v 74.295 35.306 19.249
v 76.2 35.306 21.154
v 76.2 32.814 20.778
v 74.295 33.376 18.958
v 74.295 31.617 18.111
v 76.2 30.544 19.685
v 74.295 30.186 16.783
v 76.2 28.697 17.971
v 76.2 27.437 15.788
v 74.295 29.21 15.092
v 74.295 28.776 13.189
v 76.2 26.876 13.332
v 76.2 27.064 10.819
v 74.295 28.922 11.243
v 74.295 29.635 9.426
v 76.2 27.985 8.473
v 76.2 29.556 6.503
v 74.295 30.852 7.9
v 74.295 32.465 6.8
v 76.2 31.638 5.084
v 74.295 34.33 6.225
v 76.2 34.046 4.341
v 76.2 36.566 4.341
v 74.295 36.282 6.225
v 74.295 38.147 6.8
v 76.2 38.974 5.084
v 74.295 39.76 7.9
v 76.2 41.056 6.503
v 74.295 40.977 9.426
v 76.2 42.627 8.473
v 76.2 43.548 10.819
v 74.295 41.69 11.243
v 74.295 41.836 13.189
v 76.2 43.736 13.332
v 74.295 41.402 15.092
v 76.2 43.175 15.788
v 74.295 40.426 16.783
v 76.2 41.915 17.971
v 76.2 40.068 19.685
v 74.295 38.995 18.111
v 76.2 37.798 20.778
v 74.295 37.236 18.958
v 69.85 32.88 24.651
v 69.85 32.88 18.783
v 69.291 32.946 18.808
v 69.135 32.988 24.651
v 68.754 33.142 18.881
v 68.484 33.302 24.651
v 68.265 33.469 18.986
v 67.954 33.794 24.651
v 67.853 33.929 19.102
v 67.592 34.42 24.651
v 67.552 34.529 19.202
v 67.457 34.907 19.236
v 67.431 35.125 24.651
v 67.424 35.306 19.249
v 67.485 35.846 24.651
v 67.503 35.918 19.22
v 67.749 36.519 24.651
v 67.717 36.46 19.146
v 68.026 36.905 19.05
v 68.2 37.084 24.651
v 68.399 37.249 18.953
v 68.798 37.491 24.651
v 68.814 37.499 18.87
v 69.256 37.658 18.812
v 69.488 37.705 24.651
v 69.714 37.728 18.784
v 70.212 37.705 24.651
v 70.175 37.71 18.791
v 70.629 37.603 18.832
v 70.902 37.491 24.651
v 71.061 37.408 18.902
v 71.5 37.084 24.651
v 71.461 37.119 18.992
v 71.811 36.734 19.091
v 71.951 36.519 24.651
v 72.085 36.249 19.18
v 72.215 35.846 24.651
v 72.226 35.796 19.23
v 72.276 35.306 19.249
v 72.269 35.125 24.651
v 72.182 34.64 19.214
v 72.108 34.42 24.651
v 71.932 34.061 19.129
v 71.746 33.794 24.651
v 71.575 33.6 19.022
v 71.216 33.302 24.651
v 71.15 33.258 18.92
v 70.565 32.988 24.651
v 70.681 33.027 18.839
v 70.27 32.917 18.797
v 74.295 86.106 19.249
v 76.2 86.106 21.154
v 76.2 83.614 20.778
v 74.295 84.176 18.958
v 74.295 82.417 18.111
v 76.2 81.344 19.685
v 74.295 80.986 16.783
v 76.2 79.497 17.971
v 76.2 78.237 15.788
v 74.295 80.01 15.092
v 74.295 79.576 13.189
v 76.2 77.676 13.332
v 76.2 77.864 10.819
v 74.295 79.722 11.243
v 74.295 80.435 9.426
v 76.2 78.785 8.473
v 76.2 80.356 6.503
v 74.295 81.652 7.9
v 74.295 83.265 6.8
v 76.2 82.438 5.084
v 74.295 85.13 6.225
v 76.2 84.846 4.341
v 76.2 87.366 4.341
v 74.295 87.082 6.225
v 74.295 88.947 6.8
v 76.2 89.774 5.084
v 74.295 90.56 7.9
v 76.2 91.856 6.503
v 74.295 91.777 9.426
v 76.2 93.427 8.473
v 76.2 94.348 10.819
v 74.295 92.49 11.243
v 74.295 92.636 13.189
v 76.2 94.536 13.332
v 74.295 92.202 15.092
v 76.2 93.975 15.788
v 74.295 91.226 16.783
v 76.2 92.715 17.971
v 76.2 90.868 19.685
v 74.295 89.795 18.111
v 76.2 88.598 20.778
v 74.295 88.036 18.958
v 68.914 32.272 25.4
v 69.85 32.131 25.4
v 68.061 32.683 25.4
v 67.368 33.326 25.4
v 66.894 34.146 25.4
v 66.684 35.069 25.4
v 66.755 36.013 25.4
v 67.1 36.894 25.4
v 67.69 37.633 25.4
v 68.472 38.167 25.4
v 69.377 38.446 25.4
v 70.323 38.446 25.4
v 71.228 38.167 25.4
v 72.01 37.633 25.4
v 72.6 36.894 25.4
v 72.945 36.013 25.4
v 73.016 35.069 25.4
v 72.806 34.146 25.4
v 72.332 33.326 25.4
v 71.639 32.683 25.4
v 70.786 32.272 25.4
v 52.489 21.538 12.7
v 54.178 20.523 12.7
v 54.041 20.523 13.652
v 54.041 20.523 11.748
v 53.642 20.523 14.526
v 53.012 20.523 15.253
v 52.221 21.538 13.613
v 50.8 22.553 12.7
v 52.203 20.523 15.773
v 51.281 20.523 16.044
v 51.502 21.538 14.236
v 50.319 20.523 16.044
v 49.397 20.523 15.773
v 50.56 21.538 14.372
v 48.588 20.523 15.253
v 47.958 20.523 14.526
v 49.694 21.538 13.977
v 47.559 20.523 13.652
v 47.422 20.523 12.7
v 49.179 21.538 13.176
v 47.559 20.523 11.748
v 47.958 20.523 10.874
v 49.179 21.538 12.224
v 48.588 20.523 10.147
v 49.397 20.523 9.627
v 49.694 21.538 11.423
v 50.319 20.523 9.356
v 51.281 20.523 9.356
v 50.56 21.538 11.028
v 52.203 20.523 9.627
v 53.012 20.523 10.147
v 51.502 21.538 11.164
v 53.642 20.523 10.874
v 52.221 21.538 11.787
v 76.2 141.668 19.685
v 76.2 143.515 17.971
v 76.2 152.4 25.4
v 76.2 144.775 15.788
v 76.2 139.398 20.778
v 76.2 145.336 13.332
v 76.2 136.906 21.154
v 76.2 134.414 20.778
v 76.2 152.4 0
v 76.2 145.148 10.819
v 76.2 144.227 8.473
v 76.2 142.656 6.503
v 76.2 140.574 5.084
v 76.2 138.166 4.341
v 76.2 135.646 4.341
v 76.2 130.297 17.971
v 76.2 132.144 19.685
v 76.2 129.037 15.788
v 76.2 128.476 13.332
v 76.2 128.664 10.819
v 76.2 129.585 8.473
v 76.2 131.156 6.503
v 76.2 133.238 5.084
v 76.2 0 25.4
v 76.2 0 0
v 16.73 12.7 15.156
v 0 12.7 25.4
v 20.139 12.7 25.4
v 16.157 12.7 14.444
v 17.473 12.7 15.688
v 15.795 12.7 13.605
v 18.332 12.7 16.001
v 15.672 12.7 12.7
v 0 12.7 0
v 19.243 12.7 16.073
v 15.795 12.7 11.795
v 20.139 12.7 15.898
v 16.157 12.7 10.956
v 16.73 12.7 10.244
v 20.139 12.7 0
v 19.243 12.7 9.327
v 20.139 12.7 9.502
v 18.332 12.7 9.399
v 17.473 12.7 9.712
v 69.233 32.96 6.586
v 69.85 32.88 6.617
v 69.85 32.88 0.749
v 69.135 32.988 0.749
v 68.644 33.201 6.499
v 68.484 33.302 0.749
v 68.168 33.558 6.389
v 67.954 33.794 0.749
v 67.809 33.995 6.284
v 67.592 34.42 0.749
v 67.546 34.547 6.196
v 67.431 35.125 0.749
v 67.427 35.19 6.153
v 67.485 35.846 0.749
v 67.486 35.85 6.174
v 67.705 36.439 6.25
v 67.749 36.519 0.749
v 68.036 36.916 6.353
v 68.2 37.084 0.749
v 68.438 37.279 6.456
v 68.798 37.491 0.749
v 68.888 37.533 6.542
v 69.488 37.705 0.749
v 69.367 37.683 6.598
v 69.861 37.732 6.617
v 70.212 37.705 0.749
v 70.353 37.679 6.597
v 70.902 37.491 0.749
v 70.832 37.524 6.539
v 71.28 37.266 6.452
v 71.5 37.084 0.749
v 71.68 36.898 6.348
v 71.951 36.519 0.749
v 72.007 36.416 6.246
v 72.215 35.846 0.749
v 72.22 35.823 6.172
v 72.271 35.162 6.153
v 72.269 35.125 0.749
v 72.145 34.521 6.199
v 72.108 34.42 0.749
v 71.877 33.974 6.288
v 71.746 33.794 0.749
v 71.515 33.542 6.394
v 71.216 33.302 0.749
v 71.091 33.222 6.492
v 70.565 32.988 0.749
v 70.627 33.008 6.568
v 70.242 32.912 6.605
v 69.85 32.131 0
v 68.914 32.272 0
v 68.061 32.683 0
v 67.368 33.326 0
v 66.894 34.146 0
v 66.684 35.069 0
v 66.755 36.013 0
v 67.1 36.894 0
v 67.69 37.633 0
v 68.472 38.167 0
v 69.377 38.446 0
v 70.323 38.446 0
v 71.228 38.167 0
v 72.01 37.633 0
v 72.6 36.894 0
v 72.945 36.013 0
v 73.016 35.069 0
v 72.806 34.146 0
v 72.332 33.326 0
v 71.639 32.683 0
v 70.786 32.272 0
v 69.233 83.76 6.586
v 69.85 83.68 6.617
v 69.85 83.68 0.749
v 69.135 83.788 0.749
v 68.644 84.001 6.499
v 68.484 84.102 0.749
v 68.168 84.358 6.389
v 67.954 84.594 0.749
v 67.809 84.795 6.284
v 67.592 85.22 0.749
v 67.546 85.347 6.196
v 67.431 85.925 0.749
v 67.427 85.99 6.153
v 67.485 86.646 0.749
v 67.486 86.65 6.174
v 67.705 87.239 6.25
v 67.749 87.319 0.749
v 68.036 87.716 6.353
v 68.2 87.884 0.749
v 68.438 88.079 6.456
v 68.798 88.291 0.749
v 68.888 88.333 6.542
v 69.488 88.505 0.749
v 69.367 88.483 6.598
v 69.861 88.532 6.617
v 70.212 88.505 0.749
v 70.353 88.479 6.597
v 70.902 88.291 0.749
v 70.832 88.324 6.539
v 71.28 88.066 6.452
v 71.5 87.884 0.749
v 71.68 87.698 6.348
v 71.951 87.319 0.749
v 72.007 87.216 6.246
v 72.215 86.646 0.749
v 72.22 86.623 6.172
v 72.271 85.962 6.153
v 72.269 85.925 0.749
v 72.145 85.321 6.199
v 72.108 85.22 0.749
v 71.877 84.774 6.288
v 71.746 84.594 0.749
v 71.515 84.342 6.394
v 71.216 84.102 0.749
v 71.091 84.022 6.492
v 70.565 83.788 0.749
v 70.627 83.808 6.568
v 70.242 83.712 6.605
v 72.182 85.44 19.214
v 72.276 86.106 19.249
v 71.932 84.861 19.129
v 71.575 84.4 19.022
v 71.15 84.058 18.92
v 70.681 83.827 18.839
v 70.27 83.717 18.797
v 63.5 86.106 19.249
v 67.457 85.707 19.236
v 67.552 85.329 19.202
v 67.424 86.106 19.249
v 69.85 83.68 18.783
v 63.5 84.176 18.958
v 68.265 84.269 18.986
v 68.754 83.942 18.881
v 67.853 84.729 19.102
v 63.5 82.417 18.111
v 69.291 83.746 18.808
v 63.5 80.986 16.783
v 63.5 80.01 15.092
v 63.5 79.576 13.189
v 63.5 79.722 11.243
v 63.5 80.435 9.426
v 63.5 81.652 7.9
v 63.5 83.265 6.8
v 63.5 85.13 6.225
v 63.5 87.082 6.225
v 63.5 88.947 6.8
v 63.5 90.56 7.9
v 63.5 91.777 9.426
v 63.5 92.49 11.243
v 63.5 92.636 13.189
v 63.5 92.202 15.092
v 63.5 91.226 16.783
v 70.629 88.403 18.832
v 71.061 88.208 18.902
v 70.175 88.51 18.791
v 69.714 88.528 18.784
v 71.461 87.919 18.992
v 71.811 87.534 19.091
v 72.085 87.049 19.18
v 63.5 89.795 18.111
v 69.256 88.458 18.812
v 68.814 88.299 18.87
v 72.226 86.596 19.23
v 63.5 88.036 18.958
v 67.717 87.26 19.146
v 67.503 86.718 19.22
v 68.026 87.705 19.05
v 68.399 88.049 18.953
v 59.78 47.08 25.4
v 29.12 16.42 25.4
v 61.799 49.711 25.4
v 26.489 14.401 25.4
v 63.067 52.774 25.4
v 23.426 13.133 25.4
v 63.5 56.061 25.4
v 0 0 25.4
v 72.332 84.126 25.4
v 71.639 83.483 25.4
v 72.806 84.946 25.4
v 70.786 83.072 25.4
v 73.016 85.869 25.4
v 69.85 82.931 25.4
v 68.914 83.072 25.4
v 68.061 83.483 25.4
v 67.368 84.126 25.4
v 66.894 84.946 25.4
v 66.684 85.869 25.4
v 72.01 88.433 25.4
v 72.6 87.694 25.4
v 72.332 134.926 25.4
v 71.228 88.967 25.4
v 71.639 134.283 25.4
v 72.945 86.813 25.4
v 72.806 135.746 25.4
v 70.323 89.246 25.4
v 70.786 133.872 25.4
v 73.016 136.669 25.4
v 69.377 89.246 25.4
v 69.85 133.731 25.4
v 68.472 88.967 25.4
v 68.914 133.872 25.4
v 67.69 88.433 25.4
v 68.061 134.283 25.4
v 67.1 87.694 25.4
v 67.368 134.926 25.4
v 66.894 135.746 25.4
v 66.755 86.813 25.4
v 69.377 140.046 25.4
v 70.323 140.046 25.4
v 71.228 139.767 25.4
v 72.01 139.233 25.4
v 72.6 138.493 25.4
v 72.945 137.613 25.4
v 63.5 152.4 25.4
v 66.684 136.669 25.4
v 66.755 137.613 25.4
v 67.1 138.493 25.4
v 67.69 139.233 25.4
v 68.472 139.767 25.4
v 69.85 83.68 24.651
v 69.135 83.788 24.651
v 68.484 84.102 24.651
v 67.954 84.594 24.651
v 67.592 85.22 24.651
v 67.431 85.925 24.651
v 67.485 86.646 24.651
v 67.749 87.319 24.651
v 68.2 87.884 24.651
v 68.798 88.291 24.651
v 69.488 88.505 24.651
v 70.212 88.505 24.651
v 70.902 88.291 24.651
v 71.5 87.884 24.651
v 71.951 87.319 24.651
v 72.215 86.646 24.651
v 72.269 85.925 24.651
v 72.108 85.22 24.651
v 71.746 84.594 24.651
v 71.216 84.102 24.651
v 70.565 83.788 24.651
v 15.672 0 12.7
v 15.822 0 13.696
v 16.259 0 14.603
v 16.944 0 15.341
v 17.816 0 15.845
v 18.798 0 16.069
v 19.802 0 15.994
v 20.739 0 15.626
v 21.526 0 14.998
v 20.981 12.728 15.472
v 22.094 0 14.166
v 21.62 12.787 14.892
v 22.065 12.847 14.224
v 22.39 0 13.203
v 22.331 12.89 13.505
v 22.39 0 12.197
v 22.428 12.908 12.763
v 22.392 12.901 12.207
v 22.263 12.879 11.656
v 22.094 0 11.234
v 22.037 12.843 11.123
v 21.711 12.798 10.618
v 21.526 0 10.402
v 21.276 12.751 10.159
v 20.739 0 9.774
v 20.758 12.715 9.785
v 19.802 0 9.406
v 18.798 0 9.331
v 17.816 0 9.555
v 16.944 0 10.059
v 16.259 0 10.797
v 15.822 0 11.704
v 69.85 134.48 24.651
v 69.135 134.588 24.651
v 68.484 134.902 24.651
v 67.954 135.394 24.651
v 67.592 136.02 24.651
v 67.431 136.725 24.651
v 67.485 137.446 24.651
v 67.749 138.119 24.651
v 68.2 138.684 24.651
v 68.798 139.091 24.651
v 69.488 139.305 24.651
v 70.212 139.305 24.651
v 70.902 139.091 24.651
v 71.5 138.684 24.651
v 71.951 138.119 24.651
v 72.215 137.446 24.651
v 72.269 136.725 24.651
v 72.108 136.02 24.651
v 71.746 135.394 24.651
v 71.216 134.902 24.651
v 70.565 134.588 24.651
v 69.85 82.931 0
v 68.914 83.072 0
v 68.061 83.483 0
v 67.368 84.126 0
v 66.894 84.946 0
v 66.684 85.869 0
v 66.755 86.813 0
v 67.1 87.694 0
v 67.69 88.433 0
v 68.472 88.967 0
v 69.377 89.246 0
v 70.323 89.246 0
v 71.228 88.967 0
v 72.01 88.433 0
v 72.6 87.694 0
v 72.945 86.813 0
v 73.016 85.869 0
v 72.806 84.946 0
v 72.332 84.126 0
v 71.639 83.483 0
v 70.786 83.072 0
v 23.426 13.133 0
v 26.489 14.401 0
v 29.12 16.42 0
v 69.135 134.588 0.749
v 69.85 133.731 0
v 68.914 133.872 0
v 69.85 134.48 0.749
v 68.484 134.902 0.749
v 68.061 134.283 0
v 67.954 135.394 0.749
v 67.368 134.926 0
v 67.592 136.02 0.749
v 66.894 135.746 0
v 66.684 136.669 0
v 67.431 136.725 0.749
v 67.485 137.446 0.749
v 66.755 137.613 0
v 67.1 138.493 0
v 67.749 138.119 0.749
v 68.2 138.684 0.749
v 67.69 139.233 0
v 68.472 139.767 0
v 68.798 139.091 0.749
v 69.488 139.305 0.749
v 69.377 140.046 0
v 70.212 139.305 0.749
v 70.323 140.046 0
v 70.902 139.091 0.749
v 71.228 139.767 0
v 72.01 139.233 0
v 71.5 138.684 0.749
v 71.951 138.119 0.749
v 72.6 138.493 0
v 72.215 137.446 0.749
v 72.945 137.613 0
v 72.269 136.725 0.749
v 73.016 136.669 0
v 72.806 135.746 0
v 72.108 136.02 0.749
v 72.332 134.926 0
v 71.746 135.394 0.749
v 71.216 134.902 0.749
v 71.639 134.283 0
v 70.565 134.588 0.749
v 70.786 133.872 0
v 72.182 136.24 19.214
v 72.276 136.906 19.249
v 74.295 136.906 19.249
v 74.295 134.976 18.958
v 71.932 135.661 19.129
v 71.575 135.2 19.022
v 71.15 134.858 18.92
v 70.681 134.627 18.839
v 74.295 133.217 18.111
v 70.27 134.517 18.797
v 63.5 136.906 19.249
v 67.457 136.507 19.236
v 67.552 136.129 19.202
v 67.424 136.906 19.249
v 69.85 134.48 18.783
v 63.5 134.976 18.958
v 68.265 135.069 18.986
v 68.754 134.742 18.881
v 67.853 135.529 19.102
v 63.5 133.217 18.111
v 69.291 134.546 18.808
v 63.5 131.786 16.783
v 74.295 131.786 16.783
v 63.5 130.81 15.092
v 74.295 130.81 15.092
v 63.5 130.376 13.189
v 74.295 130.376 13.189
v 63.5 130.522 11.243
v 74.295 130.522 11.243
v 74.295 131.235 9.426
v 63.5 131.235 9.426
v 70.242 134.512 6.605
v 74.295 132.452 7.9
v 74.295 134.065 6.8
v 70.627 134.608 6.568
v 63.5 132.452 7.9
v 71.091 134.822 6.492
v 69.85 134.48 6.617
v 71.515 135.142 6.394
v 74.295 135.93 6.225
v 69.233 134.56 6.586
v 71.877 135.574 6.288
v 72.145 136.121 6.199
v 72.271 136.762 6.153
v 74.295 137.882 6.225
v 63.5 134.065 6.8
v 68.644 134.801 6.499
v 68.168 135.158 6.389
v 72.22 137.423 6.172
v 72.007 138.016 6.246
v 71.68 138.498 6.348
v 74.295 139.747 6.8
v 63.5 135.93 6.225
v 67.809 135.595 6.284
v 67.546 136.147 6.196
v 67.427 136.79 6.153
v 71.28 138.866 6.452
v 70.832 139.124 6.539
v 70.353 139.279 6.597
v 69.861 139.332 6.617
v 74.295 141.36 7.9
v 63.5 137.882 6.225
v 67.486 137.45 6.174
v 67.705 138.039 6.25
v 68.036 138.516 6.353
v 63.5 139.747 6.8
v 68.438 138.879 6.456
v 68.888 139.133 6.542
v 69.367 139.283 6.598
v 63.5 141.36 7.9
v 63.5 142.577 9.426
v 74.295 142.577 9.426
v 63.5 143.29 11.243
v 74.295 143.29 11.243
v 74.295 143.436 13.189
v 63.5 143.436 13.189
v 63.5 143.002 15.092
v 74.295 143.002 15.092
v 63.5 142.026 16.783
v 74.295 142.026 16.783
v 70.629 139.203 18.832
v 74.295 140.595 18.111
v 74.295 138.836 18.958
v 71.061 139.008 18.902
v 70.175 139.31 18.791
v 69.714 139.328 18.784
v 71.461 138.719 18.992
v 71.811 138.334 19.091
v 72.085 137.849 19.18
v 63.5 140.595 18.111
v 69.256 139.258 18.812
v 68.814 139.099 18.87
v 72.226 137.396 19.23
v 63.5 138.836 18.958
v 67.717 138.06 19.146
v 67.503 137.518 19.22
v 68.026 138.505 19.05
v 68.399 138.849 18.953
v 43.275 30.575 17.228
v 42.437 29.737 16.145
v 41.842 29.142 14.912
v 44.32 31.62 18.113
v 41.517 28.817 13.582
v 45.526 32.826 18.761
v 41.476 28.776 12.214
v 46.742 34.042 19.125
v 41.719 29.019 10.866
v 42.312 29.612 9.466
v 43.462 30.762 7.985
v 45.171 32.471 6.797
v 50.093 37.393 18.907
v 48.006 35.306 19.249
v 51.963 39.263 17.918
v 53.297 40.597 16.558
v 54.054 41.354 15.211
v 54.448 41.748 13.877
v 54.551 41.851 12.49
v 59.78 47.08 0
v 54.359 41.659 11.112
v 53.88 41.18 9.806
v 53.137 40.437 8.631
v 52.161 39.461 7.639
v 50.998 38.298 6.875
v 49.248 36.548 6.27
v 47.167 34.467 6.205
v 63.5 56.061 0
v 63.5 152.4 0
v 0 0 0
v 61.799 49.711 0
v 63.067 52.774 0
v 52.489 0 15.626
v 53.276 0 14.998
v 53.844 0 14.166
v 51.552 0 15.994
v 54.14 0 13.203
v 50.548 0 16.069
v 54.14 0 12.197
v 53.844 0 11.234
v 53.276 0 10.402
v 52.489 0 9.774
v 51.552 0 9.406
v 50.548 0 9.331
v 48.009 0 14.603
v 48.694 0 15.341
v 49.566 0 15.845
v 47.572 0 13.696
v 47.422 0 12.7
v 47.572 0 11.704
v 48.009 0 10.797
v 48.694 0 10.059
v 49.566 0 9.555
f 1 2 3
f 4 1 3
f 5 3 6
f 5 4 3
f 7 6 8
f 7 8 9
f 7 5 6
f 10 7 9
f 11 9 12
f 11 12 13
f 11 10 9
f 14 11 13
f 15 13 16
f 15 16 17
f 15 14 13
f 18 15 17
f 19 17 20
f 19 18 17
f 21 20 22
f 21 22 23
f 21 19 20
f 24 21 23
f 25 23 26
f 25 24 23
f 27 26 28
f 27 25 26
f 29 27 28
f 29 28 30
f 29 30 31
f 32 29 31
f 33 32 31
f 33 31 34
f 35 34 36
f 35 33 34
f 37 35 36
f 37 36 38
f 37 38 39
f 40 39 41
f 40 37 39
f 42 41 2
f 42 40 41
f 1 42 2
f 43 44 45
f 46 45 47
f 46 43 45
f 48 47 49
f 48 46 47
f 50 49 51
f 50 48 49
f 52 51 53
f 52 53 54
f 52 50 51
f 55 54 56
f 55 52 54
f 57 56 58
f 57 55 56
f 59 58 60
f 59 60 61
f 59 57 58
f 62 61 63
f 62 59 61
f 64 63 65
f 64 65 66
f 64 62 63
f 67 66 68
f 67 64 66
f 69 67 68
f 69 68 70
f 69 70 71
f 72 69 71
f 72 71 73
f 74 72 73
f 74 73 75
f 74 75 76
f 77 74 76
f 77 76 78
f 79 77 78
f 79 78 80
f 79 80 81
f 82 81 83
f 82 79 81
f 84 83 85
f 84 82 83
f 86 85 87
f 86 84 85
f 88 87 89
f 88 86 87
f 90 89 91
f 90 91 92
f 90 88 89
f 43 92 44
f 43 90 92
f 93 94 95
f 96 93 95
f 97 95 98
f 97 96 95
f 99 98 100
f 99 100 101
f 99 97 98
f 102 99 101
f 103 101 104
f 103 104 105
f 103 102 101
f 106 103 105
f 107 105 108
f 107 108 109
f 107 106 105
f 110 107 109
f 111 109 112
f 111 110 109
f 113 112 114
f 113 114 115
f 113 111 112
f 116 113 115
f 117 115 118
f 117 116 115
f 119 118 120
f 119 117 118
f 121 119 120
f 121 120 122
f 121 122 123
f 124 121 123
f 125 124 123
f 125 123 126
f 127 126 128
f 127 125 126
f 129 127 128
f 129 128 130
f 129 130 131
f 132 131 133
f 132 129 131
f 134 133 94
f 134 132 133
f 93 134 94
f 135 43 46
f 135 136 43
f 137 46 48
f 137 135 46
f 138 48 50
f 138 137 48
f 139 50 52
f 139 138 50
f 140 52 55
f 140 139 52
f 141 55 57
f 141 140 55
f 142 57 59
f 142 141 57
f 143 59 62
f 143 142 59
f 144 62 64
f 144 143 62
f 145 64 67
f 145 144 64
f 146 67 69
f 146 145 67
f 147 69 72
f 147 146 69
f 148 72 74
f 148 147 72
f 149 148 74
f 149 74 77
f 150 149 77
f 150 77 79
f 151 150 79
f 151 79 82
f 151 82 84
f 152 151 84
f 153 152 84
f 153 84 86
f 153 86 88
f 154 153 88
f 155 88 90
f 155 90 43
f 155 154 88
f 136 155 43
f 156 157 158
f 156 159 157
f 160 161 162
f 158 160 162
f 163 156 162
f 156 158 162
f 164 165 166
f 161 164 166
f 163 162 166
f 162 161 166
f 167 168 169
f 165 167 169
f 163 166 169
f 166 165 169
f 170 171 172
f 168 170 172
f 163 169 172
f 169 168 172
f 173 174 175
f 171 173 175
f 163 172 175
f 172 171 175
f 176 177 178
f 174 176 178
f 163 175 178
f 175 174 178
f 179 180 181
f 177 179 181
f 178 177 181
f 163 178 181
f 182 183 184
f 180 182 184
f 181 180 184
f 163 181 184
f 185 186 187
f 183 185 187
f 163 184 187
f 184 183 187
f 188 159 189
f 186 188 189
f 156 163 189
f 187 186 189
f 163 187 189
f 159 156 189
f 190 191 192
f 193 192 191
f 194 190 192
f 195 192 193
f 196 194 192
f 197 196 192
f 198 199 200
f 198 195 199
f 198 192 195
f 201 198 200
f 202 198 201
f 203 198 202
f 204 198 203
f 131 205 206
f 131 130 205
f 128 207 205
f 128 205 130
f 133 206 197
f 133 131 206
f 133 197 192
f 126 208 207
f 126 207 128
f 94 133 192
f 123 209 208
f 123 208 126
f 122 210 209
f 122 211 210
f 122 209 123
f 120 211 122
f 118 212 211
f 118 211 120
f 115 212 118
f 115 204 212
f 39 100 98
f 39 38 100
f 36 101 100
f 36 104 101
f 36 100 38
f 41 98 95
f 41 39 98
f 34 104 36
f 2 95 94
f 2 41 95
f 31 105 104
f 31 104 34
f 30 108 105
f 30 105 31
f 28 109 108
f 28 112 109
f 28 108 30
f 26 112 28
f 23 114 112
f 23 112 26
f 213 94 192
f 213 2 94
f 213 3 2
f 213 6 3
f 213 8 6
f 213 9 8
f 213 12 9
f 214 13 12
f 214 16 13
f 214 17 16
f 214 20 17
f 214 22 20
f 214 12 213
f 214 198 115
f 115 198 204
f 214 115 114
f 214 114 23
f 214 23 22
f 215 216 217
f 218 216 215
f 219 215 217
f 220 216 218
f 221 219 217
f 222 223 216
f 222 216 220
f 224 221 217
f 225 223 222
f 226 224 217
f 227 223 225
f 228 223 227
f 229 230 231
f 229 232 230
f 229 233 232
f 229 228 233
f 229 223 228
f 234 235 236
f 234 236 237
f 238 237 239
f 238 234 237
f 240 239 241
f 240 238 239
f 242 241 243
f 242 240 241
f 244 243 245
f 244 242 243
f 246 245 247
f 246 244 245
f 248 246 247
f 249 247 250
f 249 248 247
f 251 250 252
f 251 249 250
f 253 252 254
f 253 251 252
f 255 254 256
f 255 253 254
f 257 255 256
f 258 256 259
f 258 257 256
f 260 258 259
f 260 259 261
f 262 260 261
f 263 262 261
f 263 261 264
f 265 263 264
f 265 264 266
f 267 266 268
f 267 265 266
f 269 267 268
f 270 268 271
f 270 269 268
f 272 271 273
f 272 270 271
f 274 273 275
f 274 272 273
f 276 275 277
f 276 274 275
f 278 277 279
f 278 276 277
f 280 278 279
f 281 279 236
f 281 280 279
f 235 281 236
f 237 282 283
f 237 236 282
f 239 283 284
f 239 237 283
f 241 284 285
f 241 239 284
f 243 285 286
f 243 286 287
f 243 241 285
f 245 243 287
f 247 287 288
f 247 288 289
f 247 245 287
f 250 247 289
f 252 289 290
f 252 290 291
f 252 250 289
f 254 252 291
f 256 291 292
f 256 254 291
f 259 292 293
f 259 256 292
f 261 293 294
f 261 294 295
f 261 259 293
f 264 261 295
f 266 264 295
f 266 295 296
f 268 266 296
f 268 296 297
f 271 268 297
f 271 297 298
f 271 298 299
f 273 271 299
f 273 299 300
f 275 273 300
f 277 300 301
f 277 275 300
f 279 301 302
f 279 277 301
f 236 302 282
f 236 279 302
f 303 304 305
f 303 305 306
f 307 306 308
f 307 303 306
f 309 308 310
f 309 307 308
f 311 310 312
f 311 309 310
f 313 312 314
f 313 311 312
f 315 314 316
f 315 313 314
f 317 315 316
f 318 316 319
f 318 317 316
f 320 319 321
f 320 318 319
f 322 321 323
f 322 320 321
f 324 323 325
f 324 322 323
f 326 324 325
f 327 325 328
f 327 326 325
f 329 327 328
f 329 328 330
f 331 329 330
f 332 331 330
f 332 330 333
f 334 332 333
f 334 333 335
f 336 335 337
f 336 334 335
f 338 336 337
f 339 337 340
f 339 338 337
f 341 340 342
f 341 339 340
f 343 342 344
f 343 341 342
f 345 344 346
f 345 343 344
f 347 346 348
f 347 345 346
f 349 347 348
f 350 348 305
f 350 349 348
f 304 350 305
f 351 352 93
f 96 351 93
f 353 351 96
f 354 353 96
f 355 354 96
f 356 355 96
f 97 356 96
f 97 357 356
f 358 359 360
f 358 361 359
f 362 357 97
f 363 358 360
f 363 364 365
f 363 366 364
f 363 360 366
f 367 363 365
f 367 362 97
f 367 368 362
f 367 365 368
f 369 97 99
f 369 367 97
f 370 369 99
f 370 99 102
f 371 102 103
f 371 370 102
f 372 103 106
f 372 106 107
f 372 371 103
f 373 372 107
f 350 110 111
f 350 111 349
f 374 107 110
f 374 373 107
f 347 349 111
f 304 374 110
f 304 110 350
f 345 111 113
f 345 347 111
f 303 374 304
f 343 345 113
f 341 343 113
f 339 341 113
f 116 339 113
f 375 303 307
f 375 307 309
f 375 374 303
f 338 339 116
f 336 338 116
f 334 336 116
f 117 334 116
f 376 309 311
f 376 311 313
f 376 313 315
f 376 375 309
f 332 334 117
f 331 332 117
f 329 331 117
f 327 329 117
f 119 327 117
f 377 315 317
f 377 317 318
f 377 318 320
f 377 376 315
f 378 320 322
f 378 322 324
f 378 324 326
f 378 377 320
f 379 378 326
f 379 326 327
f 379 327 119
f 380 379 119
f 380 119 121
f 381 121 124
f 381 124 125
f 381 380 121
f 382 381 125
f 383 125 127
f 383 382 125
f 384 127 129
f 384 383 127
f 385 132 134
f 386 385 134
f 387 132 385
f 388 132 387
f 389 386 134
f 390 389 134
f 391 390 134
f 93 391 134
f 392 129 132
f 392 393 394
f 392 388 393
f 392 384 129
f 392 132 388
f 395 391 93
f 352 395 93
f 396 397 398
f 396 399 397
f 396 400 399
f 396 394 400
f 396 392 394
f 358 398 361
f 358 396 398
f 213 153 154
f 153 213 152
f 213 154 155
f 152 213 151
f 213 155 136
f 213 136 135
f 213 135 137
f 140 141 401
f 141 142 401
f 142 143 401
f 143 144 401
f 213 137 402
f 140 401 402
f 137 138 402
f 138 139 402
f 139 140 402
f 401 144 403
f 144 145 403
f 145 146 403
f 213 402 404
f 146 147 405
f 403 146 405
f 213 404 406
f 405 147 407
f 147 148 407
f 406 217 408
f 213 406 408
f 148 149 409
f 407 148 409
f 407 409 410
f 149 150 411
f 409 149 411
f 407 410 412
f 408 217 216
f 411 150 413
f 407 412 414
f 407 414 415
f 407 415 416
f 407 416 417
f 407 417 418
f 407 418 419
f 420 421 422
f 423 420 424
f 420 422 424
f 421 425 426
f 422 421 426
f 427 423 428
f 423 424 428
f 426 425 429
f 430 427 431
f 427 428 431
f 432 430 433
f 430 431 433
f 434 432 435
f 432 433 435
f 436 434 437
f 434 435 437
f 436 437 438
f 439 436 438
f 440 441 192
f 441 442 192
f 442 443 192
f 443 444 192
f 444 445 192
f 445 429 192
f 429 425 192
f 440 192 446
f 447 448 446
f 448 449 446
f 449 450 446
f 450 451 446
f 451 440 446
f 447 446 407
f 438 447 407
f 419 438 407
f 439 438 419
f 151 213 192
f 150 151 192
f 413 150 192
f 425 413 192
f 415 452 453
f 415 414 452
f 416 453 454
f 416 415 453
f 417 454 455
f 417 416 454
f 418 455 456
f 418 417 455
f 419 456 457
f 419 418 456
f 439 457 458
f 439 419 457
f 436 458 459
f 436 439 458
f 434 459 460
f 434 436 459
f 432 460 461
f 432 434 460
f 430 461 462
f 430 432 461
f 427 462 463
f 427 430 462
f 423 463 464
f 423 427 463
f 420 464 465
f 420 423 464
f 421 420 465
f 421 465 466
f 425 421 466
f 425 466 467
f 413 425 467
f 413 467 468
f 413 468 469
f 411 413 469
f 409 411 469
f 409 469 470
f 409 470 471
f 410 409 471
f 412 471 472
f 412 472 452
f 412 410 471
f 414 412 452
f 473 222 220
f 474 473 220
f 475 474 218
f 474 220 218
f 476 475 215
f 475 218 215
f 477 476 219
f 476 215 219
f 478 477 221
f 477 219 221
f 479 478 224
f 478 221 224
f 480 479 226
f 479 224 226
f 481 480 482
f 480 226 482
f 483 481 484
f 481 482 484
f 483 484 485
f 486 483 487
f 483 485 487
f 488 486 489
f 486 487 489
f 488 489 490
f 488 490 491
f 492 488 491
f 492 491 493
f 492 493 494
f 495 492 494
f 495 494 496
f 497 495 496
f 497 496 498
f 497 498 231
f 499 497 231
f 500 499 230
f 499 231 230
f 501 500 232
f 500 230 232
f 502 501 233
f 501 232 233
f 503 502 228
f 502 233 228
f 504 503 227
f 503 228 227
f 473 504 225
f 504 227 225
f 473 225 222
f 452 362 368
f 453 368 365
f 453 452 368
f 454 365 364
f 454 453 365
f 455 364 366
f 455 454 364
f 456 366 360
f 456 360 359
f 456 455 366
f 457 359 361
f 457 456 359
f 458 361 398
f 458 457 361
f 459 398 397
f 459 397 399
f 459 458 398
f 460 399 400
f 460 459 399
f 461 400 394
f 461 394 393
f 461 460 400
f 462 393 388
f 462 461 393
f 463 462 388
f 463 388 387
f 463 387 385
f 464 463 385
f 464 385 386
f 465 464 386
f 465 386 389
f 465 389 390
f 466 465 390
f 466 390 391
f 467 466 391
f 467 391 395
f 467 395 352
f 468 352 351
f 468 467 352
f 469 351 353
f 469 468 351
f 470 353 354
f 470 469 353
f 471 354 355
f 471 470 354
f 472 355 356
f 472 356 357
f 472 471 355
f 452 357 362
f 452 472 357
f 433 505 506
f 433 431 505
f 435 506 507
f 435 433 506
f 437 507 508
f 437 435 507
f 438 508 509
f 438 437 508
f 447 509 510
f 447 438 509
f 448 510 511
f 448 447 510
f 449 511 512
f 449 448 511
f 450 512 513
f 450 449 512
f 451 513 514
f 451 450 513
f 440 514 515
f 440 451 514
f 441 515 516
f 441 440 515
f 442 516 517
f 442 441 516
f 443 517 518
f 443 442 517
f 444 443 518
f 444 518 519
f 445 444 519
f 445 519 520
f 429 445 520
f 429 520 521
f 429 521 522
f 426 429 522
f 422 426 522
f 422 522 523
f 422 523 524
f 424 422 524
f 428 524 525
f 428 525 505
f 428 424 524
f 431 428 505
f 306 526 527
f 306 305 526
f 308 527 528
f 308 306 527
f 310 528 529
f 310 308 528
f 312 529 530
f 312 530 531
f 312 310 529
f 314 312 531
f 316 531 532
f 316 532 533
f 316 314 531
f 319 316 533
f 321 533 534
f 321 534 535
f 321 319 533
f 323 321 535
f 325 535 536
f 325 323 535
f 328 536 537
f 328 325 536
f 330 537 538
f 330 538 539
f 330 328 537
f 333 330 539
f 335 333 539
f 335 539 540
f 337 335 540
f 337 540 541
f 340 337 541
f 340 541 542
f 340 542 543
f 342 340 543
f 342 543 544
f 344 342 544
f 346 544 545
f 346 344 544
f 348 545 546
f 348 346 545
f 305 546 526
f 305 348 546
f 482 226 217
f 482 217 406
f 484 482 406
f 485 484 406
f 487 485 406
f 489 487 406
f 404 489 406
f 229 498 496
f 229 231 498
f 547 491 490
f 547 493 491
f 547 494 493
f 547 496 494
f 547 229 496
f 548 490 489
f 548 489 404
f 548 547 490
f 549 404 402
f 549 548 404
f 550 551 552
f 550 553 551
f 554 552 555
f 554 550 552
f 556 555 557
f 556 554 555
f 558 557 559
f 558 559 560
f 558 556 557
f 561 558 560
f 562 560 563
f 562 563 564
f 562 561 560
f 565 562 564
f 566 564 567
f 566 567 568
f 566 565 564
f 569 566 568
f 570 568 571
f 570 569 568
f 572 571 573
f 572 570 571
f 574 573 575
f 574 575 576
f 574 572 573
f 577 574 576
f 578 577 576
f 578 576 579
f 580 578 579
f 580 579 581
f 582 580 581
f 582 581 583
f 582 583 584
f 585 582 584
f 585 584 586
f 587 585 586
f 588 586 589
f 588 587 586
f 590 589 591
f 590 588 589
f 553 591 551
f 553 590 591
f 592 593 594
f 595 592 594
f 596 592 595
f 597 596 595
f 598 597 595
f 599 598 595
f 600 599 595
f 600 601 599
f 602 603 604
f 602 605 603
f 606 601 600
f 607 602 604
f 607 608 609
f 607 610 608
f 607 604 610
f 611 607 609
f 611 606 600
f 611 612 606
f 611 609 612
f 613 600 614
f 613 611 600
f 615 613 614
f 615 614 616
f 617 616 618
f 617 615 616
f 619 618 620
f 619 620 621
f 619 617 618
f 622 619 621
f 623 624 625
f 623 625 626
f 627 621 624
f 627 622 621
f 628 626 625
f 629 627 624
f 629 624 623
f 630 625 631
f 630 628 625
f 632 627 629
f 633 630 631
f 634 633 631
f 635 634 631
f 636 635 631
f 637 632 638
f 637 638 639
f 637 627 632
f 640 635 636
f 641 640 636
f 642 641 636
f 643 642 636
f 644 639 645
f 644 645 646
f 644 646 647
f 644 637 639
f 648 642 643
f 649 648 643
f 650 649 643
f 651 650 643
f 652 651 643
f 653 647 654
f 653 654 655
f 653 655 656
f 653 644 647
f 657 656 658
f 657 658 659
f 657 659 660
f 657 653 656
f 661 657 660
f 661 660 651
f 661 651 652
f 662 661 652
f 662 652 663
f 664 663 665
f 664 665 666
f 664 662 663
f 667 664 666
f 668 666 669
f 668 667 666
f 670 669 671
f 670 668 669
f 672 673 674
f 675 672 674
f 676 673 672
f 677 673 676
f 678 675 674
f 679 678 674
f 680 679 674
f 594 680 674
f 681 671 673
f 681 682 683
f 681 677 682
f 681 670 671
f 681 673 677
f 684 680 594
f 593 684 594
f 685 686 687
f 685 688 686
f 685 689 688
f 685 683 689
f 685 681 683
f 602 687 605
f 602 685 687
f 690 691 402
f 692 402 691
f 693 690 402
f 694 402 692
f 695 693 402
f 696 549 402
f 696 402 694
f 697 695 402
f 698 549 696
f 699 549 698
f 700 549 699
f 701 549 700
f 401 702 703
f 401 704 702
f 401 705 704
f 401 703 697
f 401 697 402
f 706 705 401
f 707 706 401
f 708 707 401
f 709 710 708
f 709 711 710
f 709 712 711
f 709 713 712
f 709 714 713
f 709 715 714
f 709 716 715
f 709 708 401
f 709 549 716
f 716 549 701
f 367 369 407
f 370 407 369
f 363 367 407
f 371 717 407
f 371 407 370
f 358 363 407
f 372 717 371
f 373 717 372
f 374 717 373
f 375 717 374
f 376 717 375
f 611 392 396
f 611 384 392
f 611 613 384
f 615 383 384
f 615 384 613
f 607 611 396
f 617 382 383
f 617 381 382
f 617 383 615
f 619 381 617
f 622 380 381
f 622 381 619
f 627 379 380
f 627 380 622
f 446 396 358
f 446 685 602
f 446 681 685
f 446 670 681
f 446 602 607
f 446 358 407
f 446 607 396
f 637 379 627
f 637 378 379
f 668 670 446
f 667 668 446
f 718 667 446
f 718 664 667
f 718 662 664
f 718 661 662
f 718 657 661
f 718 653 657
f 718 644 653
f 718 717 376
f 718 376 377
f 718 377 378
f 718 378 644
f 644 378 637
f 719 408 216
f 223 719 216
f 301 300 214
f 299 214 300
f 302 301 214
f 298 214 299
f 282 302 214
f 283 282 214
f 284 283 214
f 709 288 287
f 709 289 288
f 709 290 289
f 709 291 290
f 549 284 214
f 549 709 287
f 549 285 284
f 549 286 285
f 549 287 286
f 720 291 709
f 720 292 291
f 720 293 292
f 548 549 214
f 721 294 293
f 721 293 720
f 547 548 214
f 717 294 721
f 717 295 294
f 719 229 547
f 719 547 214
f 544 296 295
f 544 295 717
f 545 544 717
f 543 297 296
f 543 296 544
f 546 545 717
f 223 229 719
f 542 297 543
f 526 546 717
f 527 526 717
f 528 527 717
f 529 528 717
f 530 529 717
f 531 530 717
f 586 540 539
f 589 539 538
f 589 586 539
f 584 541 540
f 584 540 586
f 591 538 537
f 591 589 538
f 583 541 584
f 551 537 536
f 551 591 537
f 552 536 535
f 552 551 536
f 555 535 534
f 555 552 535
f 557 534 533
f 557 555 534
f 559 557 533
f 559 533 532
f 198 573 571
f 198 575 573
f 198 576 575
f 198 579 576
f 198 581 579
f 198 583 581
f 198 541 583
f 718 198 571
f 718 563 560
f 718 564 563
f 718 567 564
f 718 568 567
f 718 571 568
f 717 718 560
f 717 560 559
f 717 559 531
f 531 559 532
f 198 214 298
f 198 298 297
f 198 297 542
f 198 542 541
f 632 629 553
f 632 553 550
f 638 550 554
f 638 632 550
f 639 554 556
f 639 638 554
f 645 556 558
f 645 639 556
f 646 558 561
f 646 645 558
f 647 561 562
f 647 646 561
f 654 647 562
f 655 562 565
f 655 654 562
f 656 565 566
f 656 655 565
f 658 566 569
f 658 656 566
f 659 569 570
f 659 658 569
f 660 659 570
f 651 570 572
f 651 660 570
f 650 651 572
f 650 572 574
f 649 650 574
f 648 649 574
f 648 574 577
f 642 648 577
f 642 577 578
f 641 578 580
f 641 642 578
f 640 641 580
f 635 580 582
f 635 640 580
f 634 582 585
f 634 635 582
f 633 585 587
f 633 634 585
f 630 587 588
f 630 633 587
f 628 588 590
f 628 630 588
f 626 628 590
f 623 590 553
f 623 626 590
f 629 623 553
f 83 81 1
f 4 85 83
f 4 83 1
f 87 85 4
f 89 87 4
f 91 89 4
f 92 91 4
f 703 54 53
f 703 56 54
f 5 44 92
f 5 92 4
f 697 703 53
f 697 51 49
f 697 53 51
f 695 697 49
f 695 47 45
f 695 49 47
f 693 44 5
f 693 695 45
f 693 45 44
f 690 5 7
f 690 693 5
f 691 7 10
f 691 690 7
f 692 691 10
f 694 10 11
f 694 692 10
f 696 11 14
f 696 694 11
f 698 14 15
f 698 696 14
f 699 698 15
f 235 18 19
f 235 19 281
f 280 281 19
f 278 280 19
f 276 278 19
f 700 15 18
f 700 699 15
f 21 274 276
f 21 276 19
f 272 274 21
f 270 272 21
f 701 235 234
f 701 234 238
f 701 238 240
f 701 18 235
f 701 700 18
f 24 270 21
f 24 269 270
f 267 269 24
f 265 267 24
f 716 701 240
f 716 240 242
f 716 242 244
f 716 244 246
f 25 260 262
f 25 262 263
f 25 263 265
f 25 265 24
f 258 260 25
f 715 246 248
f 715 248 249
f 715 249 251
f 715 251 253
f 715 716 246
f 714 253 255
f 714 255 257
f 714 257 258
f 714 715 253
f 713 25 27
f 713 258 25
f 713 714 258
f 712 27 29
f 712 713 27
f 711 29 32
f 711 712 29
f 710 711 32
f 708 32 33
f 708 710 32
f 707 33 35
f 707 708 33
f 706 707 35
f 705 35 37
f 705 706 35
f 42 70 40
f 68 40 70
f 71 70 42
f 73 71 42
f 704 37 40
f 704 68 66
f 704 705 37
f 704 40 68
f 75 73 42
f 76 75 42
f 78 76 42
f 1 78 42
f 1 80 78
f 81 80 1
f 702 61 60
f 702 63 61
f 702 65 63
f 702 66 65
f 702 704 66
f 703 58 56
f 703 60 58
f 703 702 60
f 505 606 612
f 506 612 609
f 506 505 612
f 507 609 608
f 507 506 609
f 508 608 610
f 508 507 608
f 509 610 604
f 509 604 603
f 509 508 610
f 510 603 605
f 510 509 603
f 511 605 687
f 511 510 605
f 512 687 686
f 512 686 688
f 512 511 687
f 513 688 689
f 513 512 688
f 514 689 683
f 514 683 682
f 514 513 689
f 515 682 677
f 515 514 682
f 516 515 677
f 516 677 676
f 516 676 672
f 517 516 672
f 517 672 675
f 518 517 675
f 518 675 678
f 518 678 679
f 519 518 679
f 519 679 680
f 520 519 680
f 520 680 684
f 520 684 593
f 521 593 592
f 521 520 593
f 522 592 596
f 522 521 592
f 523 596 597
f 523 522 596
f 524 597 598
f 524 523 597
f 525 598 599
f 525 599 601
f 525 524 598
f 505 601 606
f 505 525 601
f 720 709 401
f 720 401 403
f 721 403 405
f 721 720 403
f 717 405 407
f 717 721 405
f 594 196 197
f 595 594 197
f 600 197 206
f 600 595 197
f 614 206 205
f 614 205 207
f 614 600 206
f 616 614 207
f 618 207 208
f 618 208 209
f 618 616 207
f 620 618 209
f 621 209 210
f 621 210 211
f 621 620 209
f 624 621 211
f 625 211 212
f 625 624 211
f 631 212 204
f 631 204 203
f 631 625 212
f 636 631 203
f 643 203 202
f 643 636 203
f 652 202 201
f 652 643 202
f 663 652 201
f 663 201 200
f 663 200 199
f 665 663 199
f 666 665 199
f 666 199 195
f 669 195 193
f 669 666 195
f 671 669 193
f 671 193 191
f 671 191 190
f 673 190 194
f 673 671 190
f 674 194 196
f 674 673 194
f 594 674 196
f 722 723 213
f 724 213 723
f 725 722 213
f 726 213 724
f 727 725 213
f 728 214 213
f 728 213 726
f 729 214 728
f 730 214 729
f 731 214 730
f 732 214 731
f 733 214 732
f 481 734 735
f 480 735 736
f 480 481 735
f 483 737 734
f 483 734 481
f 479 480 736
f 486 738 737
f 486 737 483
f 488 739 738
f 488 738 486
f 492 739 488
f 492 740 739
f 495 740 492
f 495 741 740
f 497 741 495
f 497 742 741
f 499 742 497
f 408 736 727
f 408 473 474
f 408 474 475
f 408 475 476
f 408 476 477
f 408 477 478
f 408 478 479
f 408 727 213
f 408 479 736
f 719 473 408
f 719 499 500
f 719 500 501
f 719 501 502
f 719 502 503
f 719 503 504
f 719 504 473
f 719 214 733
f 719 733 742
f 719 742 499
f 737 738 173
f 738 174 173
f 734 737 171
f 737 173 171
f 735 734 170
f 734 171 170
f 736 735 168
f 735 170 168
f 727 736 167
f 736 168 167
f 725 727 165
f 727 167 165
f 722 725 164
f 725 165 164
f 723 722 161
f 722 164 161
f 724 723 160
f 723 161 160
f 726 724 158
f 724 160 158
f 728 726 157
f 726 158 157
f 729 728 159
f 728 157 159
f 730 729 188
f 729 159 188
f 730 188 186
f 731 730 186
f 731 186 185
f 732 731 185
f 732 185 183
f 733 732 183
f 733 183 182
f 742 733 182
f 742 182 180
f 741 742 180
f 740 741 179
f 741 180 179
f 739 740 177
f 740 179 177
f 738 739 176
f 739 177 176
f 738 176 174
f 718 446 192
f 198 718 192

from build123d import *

# Parameters (mm, degrees)
BOSS_EXTRUDE1_DEPTH                       = 25.4
TAPPED_HOLE_FOR_1_4_20_HELICOIL1_D        = 6.7564
TAPPED_HOLE_FOR_1_4_20_HELICOIL1_DEPTH    = 20.5232
TAPPED_HOLE_FOR_1_4_20_HELICOIL1_TIP      = 2.029827343
F_33_64_0_51563_DIAMETER_HOLE1_AT_2_COUNT = 2
F_33_64_0_51563_DIAMETER_HOLE1_AT_2_PITCH = 50.8
F_33_64_0_51563_DIAMETER_HOLE1_AT_3_COUNT = 2
F_33_64_0_51563_DIAMETER_HOLE1_AT_3_PITCH = 50.8
F_11_0_191_DIAMETER_HOLE1_AT_2_COUNT      = 2
F_11_0_191_DIAMETER_HOLE1_AT_2_PITCH      = 50.8
F_11_0_191_DIAMETER_HOLE1_AT_3_COUNT      = 2
F_11_0_191_DIAMETER_HOLE1_AT_3_PITCH      = 50.8


with BuildPart() as part:
    # Sketch1 → Boss-Extrude1 (new body)
    with BuildSketch(Plane.XY):
        with BuildLine():
            Line((0, 0), (0, 12.7))
            Line((0, 12.7), (20.139487758, 12.7))
            ThreePointArc((20.139487758, 12.7), (24.999567349, 13.666729937), (29.119743879, 16.419743879))
            Line((29.119743879, 16.419743879), (59.780256121, 47.080256121))
            ThreePointArc((59.780256121, 47.080256121), (62.533270063, 51.200432651), (63.5, 56.060512242))
            Line((63.5, 56.060512242), (63.5, 152.4))
            Line((63.5, 152.4), (76.2, 152.4))
            Line((76.2, 152.4), (76.2, 0))
            Line((76.2, 0), (0, 0))
        make_face()
    extrude(amount=BOSS_EXTRUDE1_DEPTH)

    # Tapped Hole for 1/4-20 Helicoil1
    with Locations(Plane.XZ):
        with Locations((19.05, 12.7), (50.8, 12.7)):
            Hole(TAPPED_HOLE_FOR_1_4_20_HELICOIL1_D / 2, depth=TAPPED_HOLE_FOR_1_4_20_HELICOIL1_DEPTH)
            with Locations((0, 0, -(TAPPED_HOLE_FOR_1_4_20_HELICOIL1_DEPTH + TAPPED_HOLE_FOR_1_4_20_HELICOIL1_TIP / 2))):  # 118° drill point
                Cone(0, TAPPED_HOLE_FOR_1_4_20_HELICOIL1_D / 2, TAPPED_HOLE_FOR_1_4_20_HELICOIL1_TIP, mode=Mode.SUBTRACT)

    # Sketch5 → 33/64 (0.51563) Diameter Hole1 (revolve, cut)
    with BuildSketch(Plane(origin=(0, 86.106, 12.7), x_dir=(0, 0, 1), z_dir=(0, 1, 0))):
        Polygon((0, 0), (0, 76.2), (8.453501, 76.2), (6.548501, 74.295), (6.548501, 0), align=None)
    f_33_64_0_51563_diameter_hole1 = revolve(axis=Axis((-6.35, 86.106, 12.7), (1, 0, 0)), mode=Mode.SUBTRACT)

    # 33/64 (0.51563) Diameter Hole1 at 2: 33/64 (0.51563) Diameter Hole1 ×2
    with Locations(*[(0, i * F_33_64_0_51563_DIAMETER_HOLE1_AT_2_PITCH, 0) for i in range(1, F_33_64_0_51563_DIAMETER_HOLE1_AT_2_COUNT)]):
        add(f_33_64_0_51563_diameter_hole1, mode=Mode.SUBTRACT)

    # 33/64 (0.51563) Diameter Hole1 at 3: 33/64 (0.51563) Diameter Hole1 ×2
    with Locations(*[(0, -i * F_33_64_0_51563_DIAMETER_HOLE1_AT_3_PITCH, 0) for i in range(1, F_33_64_0_51563_DIAMETER_HOLE1_AT_3_COUNT)]):
        add(f_33_64_0_51563_diameter_hole1, mode=Mode.SUBTRACT)

    # Sketch7 → #11 (0.191) Diameter Hole1 (revolve, cut)
    with BuildSketch(Plane(origin=(69.85, 86.106, 25.4), x_dir=(0, -1, 0), z_dir=(1, 0, 0))):
        Polygon((0, 0), (0, 25.4), (3.175, 25.4), (2.4257, 24.6507), (2.4257, 0.7493), (3.175, 0), align=None)
    f_11_0_191_diameter_hole1 = revolve(axis=Axis((69.85, 86.106, 31.75), (0, 0, -1)), mode=Mode.SUBTRACT)

    # #11 (0.191) Diameter Hole1 at 2: #11 (0.191) Diameter Hole1 ×2
    with Locations(*[(0, i * F_11_0_191_DIAMETER_HOLE1_AT_2_PITCH, 0) for i in range(1, F_11_0_191_DIAMETER_HOLE1_AT_2_COUNT)]):
        add(f_11_0_191_diameter_hole1, mode=Mode.SUBTRACT)

    # #11 (0.191) Diameter Hole1 at 3: #11 (0.191) Diameter Hole1 ×2
    with Locations(*[(0, -i * F_11_0_191_DIAMETER_HOLE1_AT_3_PITCH, 0) for i in range(1, F_11_0_191_DIAMETER_HOLE1_AT_3_COUNT)]):
        add(f_11_0_191_diameter_hole1, mode=Mode.SUBTRACT)


solid = part.part
